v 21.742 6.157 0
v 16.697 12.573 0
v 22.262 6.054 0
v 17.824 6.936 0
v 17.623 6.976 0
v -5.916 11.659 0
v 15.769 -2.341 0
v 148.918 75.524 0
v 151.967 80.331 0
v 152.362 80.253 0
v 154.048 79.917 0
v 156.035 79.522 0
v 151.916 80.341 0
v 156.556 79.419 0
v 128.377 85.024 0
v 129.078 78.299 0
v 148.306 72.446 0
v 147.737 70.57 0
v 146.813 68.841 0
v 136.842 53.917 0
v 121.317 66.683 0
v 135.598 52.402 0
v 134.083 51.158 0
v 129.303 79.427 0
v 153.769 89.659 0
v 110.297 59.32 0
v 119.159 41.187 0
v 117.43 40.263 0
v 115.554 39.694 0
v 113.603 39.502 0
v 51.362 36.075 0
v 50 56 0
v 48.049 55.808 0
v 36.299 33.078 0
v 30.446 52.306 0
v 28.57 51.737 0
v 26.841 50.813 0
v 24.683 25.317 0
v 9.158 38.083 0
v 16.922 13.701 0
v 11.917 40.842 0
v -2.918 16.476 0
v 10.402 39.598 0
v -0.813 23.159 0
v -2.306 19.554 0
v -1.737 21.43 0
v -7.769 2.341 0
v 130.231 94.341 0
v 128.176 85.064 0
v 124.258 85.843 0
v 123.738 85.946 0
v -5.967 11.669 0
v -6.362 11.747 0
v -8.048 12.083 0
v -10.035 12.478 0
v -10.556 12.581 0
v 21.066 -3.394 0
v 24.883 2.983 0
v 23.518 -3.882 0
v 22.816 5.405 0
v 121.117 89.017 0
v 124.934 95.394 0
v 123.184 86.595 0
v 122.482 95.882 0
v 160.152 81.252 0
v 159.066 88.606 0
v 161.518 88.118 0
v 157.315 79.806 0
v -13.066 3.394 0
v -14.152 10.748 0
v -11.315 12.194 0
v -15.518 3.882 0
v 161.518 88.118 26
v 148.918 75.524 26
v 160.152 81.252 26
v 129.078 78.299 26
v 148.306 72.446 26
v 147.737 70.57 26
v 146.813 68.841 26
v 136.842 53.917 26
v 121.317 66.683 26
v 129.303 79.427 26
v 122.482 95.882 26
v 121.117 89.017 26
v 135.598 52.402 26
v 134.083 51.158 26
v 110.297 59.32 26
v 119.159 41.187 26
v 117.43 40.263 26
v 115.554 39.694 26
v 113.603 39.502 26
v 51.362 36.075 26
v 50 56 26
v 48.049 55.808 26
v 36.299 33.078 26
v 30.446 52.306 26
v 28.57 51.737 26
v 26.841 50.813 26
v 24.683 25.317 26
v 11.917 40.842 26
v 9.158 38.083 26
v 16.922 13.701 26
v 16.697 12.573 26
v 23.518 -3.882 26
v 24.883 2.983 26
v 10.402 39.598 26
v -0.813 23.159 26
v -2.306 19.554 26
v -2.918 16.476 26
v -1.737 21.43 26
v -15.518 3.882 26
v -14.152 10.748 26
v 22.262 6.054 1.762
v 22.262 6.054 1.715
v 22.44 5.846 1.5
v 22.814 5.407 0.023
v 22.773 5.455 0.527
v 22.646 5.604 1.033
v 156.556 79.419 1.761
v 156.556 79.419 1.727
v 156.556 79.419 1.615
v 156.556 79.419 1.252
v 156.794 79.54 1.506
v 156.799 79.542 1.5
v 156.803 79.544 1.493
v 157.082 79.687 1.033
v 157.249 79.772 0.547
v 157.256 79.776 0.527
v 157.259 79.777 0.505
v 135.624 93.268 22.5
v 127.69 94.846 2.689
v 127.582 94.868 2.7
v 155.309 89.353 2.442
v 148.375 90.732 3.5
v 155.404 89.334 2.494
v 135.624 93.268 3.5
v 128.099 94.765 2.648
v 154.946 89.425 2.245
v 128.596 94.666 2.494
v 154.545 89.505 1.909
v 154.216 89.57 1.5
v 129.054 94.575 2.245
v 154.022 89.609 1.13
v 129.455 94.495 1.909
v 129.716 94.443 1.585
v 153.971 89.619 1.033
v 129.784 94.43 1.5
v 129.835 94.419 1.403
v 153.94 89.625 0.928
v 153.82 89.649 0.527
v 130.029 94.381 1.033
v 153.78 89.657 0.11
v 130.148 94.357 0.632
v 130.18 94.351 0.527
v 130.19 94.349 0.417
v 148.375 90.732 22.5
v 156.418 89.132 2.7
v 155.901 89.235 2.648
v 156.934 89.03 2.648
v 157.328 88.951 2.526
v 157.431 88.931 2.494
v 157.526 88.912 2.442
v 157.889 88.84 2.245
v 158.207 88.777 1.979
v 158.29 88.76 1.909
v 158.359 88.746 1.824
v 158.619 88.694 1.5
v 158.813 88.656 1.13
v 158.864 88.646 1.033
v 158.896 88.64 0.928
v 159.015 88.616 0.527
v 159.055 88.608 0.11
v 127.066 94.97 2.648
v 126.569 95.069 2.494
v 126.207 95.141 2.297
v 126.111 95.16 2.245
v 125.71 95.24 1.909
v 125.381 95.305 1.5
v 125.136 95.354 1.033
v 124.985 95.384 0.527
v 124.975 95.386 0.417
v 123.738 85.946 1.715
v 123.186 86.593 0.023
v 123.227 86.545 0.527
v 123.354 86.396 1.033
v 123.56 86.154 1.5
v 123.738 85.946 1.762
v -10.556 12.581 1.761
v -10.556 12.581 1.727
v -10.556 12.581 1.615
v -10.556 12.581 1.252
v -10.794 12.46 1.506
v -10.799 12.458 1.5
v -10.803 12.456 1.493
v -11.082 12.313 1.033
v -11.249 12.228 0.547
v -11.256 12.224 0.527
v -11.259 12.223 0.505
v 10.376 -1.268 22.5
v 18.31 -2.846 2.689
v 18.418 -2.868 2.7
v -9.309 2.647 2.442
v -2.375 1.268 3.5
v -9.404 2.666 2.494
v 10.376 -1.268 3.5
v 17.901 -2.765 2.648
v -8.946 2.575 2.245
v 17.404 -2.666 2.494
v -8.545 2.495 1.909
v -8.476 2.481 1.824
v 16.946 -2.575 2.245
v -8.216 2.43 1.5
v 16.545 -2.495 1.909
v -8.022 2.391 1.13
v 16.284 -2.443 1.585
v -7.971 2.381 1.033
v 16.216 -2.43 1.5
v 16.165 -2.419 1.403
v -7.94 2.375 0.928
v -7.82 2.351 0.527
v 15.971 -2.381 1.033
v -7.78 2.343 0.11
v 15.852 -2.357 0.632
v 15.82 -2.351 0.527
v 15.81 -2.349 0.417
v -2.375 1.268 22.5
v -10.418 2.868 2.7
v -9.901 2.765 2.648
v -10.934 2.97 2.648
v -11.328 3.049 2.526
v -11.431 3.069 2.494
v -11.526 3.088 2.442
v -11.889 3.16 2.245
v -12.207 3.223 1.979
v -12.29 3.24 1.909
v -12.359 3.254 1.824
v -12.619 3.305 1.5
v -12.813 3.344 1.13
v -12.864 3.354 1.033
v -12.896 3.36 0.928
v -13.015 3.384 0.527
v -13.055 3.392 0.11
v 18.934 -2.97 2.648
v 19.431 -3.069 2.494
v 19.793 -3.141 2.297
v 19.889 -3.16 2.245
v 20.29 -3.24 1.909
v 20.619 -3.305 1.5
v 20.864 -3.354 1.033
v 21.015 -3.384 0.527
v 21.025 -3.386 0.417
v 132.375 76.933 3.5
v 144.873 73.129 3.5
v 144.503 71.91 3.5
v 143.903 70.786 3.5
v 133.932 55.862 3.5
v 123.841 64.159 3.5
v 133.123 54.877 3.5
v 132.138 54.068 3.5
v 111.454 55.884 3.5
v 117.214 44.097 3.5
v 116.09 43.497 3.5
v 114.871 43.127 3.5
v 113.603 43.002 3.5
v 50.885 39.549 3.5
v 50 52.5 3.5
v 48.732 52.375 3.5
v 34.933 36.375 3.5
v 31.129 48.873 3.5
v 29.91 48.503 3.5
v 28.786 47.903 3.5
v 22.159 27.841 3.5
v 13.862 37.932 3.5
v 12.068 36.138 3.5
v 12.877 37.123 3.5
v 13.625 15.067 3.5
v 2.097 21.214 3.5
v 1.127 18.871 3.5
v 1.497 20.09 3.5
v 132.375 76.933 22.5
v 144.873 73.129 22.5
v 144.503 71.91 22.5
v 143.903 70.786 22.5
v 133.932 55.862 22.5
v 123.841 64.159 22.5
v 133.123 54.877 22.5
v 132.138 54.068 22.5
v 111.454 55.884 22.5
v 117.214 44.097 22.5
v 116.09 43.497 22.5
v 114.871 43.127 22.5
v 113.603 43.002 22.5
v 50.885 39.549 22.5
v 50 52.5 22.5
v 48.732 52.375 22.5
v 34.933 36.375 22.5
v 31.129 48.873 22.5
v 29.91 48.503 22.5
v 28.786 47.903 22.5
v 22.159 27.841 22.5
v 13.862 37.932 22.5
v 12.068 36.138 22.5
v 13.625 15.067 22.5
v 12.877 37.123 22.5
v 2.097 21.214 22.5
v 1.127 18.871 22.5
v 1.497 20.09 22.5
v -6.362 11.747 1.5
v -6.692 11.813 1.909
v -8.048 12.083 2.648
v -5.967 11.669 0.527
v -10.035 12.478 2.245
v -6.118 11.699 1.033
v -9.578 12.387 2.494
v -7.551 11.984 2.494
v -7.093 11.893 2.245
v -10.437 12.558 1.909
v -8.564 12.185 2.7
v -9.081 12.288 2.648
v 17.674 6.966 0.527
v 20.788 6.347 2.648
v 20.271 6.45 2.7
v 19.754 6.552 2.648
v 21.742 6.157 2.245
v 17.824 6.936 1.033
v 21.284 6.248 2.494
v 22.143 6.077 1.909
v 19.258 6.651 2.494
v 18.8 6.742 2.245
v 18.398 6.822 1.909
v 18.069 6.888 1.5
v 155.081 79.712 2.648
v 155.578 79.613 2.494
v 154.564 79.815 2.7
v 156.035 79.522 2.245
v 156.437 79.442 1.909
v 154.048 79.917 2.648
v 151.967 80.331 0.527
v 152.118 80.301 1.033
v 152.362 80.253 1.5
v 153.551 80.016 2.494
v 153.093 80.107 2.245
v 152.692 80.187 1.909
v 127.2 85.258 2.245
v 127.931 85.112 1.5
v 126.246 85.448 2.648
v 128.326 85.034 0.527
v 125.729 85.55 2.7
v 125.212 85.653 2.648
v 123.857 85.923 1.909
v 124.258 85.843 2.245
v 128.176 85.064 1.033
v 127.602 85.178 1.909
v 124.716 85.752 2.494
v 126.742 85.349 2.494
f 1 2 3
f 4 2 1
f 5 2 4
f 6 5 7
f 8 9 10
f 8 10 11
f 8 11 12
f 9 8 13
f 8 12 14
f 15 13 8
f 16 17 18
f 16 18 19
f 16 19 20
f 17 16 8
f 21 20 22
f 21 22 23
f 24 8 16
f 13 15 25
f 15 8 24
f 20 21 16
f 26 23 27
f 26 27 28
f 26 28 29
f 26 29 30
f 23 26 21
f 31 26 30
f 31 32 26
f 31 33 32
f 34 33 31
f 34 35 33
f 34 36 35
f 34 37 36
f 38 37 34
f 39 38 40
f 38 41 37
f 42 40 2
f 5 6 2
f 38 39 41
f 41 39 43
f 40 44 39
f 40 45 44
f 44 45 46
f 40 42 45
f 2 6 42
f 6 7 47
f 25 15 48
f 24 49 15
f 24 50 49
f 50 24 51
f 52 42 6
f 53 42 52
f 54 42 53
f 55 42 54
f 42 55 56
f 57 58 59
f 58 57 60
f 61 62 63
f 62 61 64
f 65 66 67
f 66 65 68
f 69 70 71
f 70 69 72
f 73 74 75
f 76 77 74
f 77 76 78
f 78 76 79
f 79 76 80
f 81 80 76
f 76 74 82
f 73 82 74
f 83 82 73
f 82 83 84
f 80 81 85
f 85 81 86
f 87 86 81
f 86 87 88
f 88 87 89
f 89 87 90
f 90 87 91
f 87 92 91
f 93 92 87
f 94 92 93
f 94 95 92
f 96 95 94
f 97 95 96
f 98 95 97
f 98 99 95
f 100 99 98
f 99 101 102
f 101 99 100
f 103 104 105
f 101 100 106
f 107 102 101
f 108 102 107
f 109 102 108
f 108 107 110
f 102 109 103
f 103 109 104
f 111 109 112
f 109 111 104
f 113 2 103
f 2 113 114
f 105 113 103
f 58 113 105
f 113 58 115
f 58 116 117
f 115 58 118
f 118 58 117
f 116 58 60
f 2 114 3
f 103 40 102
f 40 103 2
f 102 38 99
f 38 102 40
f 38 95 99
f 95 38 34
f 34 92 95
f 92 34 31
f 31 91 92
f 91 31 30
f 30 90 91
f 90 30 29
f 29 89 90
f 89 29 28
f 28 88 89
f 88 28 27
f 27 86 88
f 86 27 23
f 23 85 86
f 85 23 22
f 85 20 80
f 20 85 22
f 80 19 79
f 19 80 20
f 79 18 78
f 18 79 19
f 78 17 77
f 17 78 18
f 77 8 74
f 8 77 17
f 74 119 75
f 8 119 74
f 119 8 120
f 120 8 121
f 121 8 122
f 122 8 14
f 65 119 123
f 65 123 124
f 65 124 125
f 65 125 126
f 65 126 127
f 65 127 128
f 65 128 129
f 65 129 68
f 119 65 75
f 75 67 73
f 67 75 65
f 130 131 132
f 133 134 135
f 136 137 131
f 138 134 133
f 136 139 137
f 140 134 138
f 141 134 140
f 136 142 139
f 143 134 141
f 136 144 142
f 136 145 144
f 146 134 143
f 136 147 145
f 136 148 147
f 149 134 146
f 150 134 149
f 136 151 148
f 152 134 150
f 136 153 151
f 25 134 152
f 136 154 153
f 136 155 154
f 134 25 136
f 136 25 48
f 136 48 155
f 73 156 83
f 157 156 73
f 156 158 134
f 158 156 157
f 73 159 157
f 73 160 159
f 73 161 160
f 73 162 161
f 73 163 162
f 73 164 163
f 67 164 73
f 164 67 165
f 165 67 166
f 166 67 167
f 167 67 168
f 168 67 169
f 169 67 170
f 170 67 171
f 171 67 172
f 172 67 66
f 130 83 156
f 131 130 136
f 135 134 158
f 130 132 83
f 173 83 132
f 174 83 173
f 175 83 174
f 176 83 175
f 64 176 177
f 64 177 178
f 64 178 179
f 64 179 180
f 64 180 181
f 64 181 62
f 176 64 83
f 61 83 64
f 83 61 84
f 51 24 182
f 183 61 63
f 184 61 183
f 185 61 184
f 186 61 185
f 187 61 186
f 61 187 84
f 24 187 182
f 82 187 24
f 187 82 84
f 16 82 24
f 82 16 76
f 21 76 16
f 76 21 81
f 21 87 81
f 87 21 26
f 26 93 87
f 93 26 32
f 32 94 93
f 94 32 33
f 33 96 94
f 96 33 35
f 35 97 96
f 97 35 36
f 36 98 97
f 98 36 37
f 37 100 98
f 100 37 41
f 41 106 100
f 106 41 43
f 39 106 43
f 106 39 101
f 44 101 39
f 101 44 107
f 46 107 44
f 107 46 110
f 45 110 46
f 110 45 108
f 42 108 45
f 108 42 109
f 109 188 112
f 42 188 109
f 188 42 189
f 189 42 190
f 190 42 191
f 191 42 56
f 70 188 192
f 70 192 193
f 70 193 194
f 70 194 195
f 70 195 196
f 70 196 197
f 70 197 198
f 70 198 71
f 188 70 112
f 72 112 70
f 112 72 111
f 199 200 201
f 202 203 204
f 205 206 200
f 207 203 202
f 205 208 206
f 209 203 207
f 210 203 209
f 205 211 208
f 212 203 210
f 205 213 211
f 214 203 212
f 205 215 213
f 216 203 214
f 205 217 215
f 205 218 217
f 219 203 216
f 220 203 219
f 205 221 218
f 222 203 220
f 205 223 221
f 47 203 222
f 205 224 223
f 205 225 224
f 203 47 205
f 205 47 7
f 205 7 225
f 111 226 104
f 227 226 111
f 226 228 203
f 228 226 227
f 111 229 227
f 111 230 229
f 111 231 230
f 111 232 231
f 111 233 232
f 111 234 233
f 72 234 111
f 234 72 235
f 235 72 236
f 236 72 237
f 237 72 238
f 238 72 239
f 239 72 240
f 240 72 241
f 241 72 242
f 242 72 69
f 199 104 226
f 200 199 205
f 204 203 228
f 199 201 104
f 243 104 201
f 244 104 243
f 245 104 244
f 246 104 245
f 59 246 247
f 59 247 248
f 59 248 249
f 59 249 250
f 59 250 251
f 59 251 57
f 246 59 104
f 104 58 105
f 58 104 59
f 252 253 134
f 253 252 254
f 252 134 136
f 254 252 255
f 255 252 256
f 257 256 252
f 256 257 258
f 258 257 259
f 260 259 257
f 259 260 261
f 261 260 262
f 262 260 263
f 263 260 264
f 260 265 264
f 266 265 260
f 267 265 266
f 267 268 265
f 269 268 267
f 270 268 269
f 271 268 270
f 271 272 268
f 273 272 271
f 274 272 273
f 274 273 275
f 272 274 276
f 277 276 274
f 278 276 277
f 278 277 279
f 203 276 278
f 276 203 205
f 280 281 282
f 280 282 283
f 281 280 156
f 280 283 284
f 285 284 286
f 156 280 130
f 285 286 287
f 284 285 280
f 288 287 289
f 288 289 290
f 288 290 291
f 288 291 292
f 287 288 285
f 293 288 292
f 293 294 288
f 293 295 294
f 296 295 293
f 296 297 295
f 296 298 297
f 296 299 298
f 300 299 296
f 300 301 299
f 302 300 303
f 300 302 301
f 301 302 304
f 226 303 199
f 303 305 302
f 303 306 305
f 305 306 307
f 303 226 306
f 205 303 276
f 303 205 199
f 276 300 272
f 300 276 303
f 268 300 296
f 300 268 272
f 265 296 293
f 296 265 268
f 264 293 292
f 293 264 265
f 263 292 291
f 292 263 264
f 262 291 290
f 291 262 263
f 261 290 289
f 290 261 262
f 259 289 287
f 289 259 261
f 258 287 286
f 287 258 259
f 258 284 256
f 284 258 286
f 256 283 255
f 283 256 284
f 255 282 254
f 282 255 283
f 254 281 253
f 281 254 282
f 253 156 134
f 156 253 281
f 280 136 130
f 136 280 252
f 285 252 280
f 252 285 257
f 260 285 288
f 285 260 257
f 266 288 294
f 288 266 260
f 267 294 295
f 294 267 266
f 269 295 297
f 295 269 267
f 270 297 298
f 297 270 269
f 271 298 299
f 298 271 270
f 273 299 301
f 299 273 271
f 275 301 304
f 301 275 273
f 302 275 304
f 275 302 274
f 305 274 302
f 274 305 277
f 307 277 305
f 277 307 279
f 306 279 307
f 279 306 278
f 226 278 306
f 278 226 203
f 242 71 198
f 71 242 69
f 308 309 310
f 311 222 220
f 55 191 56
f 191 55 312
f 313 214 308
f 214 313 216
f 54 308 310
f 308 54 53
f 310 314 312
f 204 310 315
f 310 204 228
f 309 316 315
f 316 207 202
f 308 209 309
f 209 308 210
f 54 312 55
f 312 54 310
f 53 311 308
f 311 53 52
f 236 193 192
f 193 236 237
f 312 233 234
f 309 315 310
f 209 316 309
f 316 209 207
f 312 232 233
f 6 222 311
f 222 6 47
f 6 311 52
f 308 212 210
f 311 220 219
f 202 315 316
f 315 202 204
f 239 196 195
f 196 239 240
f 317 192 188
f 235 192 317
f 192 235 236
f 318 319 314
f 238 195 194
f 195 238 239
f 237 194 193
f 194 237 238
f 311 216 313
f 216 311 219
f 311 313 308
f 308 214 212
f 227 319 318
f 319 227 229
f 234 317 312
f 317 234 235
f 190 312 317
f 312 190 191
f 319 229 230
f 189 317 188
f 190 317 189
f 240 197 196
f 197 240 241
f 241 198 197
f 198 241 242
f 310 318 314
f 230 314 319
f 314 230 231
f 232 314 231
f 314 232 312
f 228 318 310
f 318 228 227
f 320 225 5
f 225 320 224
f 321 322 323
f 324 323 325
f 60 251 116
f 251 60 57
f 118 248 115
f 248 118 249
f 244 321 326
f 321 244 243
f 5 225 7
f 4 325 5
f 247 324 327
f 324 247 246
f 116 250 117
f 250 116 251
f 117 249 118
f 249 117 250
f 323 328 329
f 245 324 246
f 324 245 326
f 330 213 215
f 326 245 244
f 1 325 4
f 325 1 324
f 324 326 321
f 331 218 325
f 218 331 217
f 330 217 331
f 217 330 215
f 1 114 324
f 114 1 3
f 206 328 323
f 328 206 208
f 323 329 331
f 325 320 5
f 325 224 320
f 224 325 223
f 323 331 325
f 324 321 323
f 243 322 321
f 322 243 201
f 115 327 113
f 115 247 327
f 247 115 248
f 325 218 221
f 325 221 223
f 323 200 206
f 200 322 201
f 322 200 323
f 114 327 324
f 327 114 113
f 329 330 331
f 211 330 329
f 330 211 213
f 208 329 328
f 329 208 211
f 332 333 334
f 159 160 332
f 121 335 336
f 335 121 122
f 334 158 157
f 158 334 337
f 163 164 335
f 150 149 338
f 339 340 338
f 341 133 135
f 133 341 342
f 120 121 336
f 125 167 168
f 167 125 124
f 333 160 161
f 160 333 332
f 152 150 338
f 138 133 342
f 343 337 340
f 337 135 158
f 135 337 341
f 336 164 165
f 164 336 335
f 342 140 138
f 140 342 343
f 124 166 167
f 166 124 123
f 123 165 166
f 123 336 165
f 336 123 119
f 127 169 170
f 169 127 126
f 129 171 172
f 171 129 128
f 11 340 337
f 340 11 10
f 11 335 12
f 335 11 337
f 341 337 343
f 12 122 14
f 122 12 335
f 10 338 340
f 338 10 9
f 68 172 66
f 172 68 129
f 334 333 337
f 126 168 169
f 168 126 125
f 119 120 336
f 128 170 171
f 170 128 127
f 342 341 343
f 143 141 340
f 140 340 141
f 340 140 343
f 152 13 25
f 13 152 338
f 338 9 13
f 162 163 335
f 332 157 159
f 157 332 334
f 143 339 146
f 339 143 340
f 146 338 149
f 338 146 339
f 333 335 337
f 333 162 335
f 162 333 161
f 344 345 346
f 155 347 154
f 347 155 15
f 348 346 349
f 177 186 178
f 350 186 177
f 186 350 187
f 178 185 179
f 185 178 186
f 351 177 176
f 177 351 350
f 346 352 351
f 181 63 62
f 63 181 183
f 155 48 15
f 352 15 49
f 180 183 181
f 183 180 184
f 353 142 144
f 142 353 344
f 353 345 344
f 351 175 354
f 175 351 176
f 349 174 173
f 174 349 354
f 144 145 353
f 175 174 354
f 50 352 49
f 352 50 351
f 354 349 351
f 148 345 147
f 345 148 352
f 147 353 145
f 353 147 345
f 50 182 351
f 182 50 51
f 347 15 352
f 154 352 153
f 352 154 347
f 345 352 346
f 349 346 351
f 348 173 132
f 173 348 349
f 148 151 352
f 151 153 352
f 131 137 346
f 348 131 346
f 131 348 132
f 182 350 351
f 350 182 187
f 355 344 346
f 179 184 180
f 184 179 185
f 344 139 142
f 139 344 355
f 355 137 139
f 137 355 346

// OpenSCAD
$fn = 32;

// ----------------------------------------------------------------------
// Air duct: 20 mm duct, 3.5 mm wall, 26 mm across
// ----------------------------------------------------------------------

// --- parameters (mm) ---
duct_r = 10;              // duct core radius
duct_d = 20;              // duct core diameter
wall = 3.5;               // duct wall thickness
height = 26;              // duct width (extrusion height)
port_r = 19.9;            // port flange half width
port_d = 39.8;            // port flange width
port_t = 7;               // port flange thickness
bolt_d = 5.4;             // port bolt holes
bolt_offset = 14.7;       // bolt hole offset from the port axis

difference() {
  /* outer hull chain: tube with a flat flange plate at every port */
  linear_extrude(height = 26) {
    hull() {
      polygon([[23.518, -3.882], [-15.518, 3.882], [-14.152, 10.748], [24.883, 2.983]]);
      translate([5.951, 9.808]) circle(r = 10);
    }
    hull() {
      translate([5.951, 9.808]) circle(r = 10);
      translate([7.502, 17.603]) circle(r = 10);
    }
    hull() {
      translate([7.502, 17.603]) circle(r = 10);
      translate([17.473, 32.527]) circle(r = 10);
    }
    hull() {
      translate([17.473, 32.527]) circle(r = 10);
      translate([32.397, 42.498]) circle(r = 10);
    }
    hull() {
      translate([32.397, 42.498]) circle(r = 10);
      translate([50, 46]) circle(r = 10);
    }
    hull() {
      translate([50, 46]) circle(r = 10);
      translate([113.603, 49.502]) circle(r = 10);
    }
    hull() {
      translate([113.603, 49.502]) circle(r = 10);
      translate([128.527, 59.473]) circle(r = 10);
    }
    hull() {
      translate([128.527, 59.473]) circle(r = 10);
      translate([138.498, 74.397]) circle(r = 10);
    }
    hull() {
      translate([138.498, 74.397]) circle(r = 10);
      translate([140.049, 82.192]) circle(r = 10);
    }
    hull() {
      translate([140.049, 82.192]) circle(r = 10);
      polygon([[122.482, 95.882], [161.518, 88.118], [160.152, 81.252], [121.117, 89.017]]);
    }
  }
  /* air passage: the same chain inset by the wall, 5 mm proud of the ports */
  translate([0, 0, 3.5]) linear_extrude(height = 19) {
    hull() {
      translate([3.025, -4.904]) circle(r = 6.5);
      translate([7.502, 17.603]) circle(r = 6.5);
    }
    hull() {
      translate([7.502, 17.603]) circle(r = 6.5);
      translate([17.473, 32.527]) circle(r = 6.5);
    }
    hull() {
      translate([17.473, 32.527]) circle(r = 6.5);
      translate([32.397, 42.498]) circle(r = 6.5);
    }
    hull() {
      translate([32.397, 42.498]) circle(r = 6.5);
      translate([50, 46]) circle(r = 6.5);
    }
    hull() {
      translate([50, 46]) circle(r = 6.5);
      translate([113.603, 49.502]) circle(r = 6.5);
    }
    hull() {
      translate([113.603, 49.502]) circle(r = 6.5);
      translate([128.527, 59.473]) circle(r = 6.5);
    }
    hull() {
      translate([128.527, 59.473]) circle(r = 6.5);
      translate([138.498, 74.397]) circle(r = 6.5);
    }
    hull() {
      translate([138.498, 74.397]) circle(r = 6.5);
      translate([142.975, 96.904]) circle(r = 6.5);
    }
  }
  translate([4, 0]) rotate([0, 0, -11.25]) translate([-14.7, -2.5]) rotate([-90, 0, 0]) cylinder(h = 12, d = 5.4);
  translate([4, 0]) rotate([0, 0, -11.25]) translate([14.7, -2.5]) rotate([-90, 0, 0]) cylinder(h = 12, d = 5.4);
  translate([142, 92]) rotate([0, 0, 168.75]) translate([-14.7, -2.5]) rotate([-90, 0, 0]) cylinder(h = 12, d = 5.4);
  translate([142, 92]) rotate([0, 0, 168.75]) translate([14.7, -2.5]) rotate([-90, 0, 0]) cylinder(h = 12, d = 5.4);
}
